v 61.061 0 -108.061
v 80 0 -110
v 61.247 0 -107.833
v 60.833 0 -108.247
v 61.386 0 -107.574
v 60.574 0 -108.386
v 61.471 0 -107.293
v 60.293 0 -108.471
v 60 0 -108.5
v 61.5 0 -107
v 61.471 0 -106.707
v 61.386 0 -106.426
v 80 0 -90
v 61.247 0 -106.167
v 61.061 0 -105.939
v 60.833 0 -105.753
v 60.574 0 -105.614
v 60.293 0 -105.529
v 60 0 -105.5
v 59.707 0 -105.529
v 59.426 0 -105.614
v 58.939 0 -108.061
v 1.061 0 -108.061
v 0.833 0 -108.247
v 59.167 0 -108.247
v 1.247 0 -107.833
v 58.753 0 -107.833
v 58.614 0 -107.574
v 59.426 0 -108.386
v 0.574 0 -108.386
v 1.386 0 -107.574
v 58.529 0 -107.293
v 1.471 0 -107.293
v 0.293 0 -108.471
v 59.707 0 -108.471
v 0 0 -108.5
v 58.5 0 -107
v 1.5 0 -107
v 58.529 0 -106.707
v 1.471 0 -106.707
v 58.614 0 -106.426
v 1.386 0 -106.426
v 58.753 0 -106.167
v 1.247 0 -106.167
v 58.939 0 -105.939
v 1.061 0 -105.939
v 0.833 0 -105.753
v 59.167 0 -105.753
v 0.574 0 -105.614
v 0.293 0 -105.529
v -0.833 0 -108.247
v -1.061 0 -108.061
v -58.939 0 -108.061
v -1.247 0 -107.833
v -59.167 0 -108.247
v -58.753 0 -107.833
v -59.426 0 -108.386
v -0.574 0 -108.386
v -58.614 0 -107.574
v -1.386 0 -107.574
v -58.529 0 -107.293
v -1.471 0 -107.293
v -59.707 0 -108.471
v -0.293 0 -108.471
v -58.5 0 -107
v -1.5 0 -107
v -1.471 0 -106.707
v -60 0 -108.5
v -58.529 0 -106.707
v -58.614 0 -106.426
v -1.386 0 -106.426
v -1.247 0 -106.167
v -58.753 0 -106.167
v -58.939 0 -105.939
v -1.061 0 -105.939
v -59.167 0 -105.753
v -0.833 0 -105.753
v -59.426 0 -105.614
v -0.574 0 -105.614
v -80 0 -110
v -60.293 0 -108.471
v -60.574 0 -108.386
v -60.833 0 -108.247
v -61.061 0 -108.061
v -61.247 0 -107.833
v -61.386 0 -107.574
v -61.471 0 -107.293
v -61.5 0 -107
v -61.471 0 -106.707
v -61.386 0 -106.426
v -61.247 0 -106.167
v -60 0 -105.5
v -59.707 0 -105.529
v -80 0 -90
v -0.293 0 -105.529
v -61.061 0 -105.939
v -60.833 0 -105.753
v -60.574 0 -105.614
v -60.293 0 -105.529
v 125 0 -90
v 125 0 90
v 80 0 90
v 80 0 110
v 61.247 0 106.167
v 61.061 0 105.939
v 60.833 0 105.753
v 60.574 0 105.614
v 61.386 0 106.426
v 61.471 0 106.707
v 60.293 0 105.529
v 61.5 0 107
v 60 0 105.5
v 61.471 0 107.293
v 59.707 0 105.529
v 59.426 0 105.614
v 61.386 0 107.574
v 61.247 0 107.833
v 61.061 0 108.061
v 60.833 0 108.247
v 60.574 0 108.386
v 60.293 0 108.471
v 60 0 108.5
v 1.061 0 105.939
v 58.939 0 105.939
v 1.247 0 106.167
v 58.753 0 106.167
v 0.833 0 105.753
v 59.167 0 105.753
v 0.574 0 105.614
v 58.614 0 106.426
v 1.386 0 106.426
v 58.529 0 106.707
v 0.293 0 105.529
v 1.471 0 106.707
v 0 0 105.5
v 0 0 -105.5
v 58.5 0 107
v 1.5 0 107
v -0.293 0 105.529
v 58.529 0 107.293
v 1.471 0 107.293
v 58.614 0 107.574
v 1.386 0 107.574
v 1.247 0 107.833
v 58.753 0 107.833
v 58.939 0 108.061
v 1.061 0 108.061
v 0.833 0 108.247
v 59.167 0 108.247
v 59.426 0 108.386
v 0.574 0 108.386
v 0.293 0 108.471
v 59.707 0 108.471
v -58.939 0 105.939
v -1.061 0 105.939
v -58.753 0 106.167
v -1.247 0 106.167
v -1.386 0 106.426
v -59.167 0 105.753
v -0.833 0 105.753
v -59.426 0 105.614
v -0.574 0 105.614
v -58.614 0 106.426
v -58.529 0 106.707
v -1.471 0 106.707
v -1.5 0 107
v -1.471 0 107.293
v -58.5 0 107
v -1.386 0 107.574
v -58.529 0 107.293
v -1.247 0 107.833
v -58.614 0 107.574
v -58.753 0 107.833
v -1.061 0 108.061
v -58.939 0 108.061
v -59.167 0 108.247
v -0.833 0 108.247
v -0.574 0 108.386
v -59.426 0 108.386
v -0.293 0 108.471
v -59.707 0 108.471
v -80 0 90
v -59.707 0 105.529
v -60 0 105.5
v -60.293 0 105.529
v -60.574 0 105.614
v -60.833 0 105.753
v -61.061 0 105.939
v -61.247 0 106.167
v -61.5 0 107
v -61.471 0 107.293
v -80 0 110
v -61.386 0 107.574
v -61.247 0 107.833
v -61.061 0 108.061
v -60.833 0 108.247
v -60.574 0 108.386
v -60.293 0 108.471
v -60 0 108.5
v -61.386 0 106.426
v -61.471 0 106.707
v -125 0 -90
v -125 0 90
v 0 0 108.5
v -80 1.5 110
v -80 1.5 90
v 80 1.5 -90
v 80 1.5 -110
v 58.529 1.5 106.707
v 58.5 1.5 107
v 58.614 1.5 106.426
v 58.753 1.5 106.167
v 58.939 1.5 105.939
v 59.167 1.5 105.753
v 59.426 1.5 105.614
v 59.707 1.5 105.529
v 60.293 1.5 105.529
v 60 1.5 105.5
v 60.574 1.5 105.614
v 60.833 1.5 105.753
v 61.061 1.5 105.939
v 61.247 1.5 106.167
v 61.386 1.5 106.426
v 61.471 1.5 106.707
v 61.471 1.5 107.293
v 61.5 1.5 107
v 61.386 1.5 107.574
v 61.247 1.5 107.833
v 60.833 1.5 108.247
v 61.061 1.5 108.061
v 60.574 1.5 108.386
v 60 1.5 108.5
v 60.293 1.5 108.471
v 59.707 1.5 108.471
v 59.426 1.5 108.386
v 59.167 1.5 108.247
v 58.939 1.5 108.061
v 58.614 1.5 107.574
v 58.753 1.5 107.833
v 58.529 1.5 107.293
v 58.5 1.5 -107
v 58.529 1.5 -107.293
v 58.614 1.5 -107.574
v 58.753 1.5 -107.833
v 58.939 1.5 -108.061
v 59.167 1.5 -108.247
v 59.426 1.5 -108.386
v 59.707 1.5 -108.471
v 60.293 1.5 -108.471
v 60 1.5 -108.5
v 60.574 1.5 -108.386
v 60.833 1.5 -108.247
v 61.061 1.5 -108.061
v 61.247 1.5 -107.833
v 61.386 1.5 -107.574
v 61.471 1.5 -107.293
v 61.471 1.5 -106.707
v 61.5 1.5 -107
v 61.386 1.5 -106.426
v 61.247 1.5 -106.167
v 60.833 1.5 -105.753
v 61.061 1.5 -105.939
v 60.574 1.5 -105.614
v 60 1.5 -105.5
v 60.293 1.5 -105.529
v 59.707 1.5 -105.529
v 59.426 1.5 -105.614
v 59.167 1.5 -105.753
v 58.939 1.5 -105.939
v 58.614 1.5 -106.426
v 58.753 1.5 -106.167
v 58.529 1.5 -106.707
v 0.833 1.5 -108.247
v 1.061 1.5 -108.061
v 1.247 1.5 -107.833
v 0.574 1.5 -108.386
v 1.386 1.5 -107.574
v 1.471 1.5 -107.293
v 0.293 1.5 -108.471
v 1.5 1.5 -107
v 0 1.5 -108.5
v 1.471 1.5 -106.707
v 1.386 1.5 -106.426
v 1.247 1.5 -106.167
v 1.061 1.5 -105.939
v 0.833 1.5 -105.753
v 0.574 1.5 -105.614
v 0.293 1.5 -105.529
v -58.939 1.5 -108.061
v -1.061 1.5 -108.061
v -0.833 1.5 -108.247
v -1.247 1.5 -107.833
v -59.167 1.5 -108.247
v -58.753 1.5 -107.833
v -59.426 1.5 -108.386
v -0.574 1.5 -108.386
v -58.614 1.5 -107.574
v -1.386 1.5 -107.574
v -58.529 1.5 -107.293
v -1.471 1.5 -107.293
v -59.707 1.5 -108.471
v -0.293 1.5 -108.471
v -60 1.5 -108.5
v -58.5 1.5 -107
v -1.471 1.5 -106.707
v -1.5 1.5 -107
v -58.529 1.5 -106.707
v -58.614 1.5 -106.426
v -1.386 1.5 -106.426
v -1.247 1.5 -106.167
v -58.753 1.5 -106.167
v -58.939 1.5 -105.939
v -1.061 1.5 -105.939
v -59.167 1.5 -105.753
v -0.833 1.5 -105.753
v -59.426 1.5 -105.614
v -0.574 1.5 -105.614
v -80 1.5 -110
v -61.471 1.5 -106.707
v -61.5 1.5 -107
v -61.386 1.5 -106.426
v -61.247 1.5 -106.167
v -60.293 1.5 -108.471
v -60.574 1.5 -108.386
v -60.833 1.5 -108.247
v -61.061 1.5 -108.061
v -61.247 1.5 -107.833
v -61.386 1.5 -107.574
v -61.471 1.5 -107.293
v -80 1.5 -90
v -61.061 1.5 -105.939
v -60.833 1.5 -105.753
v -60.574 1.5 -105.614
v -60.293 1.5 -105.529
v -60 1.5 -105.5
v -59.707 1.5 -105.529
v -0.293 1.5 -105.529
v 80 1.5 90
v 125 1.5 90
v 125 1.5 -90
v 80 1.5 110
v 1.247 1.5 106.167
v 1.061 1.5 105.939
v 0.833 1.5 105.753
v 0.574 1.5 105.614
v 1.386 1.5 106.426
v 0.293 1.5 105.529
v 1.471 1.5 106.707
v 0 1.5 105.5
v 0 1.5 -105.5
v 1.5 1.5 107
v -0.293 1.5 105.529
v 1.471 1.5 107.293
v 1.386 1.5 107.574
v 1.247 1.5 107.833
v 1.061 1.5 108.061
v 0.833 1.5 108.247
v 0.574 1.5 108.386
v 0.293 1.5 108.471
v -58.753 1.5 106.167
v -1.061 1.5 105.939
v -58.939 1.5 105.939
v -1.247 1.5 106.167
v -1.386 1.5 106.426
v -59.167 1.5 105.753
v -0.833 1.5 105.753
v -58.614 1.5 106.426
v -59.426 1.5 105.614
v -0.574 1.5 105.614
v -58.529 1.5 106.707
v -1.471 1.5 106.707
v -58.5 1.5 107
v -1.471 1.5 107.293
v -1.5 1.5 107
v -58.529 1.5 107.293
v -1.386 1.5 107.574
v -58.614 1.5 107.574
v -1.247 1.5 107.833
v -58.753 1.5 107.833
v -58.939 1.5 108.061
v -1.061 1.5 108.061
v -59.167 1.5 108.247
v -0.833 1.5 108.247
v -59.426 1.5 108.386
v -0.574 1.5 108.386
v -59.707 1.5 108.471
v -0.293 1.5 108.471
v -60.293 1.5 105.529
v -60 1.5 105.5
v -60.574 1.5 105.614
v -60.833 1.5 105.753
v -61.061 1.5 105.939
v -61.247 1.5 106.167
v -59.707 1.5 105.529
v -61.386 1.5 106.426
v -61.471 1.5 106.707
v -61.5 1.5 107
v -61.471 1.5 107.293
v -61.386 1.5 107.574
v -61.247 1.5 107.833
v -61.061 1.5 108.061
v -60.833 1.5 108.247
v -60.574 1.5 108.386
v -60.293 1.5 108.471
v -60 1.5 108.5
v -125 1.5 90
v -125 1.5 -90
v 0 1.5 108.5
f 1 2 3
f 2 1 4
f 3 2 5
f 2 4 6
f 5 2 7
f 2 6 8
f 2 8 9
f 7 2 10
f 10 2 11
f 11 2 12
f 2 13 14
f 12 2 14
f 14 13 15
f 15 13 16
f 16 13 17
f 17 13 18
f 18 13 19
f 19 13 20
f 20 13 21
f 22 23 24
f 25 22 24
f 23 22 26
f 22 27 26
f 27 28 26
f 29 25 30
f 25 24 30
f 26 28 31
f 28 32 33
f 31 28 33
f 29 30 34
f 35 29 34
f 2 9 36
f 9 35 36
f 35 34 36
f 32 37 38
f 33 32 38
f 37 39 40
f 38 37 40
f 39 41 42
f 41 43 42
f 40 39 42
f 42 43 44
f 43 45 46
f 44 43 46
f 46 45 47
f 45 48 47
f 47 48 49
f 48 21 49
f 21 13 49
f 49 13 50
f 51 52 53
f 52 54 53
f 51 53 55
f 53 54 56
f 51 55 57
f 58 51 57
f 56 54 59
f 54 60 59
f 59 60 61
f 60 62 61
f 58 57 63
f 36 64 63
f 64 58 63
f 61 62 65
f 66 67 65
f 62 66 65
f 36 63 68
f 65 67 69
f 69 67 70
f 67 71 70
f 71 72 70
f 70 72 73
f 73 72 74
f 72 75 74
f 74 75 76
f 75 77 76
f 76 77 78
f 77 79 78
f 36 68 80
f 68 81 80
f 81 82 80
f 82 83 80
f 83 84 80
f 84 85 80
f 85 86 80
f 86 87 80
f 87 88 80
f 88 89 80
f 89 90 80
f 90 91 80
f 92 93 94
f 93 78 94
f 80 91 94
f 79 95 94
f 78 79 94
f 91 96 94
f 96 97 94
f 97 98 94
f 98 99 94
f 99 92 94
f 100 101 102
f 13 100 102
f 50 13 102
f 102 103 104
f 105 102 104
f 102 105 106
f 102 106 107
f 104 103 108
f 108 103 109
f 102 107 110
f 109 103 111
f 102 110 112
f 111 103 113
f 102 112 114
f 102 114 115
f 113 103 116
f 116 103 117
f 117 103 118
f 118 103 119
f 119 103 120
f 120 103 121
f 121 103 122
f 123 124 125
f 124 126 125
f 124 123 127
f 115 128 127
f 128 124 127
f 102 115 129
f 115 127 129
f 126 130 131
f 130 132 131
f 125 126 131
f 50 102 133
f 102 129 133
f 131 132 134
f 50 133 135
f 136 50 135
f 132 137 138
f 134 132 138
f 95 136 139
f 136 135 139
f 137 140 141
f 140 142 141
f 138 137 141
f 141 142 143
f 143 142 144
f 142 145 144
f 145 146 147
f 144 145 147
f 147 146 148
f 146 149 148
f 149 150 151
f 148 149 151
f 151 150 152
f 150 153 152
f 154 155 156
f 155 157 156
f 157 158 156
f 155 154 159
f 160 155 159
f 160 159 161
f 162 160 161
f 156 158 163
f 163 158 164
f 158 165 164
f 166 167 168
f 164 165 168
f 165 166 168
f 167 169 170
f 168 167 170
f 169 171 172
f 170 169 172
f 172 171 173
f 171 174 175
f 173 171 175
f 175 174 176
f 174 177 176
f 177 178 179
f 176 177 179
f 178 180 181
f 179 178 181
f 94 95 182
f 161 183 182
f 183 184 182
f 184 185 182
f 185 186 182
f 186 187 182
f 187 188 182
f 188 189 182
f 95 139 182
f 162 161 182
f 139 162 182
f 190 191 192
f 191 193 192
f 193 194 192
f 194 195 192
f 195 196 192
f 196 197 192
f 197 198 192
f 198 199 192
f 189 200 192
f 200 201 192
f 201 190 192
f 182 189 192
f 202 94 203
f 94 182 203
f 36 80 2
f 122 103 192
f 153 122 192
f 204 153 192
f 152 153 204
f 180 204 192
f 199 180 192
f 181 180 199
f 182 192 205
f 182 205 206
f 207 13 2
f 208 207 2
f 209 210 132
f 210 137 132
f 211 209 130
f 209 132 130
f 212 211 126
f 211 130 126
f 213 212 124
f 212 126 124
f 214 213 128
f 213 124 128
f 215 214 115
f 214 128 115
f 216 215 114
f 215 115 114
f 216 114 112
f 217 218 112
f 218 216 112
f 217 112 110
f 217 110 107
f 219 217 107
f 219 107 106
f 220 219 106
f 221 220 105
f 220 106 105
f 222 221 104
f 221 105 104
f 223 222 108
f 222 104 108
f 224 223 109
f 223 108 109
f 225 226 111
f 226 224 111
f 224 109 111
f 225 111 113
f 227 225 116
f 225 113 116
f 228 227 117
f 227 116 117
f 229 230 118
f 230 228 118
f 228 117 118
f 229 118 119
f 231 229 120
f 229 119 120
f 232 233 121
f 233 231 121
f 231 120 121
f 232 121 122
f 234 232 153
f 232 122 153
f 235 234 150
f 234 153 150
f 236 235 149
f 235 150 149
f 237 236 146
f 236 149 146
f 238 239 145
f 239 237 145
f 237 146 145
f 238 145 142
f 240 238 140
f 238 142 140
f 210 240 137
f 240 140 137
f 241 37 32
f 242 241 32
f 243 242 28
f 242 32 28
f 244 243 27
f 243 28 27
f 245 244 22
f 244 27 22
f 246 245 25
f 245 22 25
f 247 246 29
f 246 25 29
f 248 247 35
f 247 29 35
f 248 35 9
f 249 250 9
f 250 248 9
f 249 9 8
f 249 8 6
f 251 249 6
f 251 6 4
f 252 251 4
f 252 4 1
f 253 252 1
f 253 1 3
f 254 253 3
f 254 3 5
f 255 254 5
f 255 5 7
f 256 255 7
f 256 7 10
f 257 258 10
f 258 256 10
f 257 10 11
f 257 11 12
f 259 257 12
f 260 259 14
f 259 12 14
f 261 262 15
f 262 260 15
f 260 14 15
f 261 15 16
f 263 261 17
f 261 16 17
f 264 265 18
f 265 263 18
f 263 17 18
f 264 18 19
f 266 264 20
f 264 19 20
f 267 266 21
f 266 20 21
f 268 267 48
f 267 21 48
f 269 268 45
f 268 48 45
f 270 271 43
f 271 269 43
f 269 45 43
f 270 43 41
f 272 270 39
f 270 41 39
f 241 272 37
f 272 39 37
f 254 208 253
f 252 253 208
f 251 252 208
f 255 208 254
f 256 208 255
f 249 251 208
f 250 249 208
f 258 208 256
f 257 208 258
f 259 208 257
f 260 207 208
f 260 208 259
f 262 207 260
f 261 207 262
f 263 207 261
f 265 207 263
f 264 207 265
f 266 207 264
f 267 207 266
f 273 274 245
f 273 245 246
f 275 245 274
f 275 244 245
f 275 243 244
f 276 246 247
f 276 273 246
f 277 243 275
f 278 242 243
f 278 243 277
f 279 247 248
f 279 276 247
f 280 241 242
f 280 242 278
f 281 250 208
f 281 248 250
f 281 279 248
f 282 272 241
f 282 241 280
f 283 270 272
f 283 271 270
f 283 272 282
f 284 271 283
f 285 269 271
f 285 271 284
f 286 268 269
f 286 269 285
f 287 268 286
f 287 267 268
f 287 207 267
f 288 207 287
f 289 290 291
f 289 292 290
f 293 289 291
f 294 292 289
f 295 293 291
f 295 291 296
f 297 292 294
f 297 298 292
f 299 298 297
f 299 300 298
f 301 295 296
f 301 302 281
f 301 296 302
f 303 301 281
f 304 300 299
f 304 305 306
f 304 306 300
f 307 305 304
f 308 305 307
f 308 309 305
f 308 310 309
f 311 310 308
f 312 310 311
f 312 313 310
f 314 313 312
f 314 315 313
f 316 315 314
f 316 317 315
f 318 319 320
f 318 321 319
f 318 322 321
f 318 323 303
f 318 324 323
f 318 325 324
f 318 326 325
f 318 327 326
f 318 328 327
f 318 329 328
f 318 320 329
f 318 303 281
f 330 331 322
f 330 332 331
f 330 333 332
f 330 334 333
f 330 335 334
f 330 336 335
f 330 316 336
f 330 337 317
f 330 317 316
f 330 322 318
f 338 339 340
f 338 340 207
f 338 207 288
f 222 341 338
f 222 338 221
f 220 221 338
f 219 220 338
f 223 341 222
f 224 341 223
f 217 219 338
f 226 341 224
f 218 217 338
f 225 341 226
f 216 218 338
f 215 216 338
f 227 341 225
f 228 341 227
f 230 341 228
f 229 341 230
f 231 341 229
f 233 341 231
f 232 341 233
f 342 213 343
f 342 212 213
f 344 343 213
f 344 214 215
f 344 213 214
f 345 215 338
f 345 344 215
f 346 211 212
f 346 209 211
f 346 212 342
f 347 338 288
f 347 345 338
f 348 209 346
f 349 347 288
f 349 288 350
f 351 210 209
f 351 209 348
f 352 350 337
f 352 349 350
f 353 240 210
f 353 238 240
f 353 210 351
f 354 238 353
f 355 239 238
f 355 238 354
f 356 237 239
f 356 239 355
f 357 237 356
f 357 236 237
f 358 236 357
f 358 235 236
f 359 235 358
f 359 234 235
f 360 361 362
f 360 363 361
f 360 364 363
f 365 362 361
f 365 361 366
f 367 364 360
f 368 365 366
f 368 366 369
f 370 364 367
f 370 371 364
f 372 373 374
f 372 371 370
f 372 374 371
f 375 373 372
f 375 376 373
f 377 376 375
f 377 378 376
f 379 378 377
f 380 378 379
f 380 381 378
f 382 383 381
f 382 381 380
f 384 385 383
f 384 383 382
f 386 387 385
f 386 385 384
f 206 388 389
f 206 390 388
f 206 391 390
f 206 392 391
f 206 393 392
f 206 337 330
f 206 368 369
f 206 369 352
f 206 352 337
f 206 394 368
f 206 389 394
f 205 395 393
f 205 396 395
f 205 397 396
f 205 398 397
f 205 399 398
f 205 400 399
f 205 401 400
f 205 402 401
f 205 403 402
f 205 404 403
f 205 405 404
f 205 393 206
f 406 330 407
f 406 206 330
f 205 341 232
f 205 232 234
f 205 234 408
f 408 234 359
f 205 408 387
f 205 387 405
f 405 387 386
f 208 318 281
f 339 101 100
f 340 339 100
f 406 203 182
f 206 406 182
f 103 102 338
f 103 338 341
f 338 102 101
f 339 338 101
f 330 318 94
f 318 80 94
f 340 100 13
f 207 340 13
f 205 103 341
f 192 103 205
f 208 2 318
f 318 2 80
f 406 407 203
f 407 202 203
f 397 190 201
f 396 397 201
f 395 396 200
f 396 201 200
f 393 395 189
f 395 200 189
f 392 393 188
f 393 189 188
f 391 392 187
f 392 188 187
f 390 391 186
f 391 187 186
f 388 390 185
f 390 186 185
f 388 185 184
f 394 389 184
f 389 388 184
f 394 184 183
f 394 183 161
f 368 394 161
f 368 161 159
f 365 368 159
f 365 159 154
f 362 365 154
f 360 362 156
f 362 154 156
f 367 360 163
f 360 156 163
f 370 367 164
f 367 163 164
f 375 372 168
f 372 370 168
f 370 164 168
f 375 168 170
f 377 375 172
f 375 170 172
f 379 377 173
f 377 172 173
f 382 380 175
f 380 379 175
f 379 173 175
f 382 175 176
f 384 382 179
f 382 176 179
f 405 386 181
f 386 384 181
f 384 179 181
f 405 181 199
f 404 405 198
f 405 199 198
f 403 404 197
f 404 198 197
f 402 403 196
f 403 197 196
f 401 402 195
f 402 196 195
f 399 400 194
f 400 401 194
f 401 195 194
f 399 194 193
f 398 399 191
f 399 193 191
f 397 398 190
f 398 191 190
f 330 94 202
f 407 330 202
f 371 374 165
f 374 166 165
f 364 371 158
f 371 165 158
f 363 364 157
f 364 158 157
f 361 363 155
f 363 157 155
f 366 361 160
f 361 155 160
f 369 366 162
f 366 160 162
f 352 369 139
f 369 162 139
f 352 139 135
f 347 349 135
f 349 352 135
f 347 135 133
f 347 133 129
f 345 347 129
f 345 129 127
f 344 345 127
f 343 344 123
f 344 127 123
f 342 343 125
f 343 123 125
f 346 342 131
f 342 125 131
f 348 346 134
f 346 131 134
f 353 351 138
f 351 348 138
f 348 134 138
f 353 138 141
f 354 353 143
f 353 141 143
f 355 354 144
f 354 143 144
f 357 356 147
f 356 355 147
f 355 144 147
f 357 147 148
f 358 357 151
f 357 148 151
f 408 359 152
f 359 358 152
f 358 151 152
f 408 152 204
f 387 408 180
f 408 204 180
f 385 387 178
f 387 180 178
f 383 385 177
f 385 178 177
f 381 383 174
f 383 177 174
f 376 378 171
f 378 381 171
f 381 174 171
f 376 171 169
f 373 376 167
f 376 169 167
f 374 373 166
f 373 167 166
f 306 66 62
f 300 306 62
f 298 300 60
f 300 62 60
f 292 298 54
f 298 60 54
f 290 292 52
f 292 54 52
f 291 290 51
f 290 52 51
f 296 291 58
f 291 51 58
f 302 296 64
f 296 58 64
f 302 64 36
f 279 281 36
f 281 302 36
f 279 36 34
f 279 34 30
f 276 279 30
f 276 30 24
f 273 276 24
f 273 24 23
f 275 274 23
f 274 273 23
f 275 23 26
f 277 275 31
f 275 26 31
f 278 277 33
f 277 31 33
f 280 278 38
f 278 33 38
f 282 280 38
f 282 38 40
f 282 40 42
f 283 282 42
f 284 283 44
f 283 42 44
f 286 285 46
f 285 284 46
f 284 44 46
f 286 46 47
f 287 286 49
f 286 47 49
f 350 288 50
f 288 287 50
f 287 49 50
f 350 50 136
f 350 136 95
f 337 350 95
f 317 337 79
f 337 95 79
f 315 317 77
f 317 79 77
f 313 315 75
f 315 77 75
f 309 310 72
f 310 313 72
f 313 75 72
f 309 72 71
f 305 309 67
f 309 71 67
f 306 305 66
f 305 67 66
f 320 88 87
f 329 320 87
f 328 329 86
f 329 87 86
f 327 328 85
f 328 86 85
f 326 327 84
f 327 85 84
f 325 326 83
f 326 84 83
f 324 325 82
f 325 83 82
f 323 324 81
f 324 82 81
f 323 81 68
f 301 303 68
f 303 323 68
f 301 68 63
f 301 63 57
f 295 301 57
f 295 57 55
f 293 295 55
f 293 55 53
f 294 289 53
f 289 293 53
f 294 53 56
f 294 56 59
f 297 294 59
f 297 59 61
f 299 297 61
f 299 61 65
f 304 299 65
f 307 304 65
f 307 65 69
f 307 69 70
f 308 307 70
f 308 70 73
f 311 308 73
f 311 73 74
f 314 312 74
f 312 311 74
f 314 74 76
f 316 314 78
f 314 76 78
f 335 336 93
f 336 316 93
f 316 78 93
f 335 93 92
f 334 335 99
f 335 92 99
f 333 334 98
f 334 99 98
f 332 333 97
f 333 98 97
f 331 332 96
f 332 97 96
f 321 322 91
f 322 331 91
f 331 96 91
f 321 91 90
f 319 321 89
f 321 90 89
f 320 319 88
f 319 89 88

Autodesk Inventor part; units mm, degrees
ref_plane "YZ Plane" through (0, 0, 0) normal (1, 0, 0) x (0, 1, 0)
ref_plane "XZ Plane" through (0, 0, 0) normal (0, 1, 0) x (-1, 0, 0)
ref_plane "XY Plane" through (0, 0, 0) normal (0, 0, 1) x (1, 0, 0)
sketch "Sketch1" plane through (0, 0, 0) normal (0, 1, 0) x (-1, 0, 0)
  line L0 (125, 90) -> (-125, 90)
  line L1 (-125, 90) -> (-125, -90)
  line L2 (-125, -90) -> (125, -90)
  line L3 (125, -90) -> (125, 90)
  line L4 (125, 90) -> (-125, -90) construction
  line L5 (-125, 90) -> (125, -90) construction
  line L6 (0, 90) -> (80, 90)
  line L7 (80, 90) -> (-80, 90)
  line L8 (-80, 90) -> (-80, 110)
  line L9 (-80, 110) -> (80, 110)
  line L10 (80, 110) -> (80, 90)
  line L11 (80, -90) -> (-80, -90)
  line L12 (-80, -90) -> (-80, -110)
  line L13 (-80, -110) -> (80, -110)
  line L14 (80, -110) -> (80, -90)
  line L15 (0, 0) -> (0, -104)
  line L16 (0, -104) -> (0, -107)
  circle A0 centre (0, -107) radius 1.5
  line L17 (0, -107) -> (60, -107)
  line L18 (0, -107) -> (-60, -107)
  circle A1 centre (60, -107) radius 1.5
  circle A2 centre (-60, -107) radius 1.5
  line L19 (0, 0) -> (20.0042, 0)
  circle A3 centre (0, 107) radius 1.5
  circle A4 centre (60, 107) radius 1.5
  circle A5 centre (-60, 107) radius 1.5
  dimension "d0" = 250
  dimension "d1" = 180
  dimension "d2" = 80
  dimension "d3" = 160
  dimension "d4" = 20
  dimension "d5" = 160
  dimension "d6" = 20
  dimension "d7" = 104
  dimension "d8" = 3
  dimension "d9" = 3
  dimension "d10" = 60
  dimension "d11" = 60
  dimension "d12" = 3
  dimension "d13" = 3
extrude "Extrusion1" add sketch "Sketch1" along normal blind 1.5
properties part number "basePlate"
